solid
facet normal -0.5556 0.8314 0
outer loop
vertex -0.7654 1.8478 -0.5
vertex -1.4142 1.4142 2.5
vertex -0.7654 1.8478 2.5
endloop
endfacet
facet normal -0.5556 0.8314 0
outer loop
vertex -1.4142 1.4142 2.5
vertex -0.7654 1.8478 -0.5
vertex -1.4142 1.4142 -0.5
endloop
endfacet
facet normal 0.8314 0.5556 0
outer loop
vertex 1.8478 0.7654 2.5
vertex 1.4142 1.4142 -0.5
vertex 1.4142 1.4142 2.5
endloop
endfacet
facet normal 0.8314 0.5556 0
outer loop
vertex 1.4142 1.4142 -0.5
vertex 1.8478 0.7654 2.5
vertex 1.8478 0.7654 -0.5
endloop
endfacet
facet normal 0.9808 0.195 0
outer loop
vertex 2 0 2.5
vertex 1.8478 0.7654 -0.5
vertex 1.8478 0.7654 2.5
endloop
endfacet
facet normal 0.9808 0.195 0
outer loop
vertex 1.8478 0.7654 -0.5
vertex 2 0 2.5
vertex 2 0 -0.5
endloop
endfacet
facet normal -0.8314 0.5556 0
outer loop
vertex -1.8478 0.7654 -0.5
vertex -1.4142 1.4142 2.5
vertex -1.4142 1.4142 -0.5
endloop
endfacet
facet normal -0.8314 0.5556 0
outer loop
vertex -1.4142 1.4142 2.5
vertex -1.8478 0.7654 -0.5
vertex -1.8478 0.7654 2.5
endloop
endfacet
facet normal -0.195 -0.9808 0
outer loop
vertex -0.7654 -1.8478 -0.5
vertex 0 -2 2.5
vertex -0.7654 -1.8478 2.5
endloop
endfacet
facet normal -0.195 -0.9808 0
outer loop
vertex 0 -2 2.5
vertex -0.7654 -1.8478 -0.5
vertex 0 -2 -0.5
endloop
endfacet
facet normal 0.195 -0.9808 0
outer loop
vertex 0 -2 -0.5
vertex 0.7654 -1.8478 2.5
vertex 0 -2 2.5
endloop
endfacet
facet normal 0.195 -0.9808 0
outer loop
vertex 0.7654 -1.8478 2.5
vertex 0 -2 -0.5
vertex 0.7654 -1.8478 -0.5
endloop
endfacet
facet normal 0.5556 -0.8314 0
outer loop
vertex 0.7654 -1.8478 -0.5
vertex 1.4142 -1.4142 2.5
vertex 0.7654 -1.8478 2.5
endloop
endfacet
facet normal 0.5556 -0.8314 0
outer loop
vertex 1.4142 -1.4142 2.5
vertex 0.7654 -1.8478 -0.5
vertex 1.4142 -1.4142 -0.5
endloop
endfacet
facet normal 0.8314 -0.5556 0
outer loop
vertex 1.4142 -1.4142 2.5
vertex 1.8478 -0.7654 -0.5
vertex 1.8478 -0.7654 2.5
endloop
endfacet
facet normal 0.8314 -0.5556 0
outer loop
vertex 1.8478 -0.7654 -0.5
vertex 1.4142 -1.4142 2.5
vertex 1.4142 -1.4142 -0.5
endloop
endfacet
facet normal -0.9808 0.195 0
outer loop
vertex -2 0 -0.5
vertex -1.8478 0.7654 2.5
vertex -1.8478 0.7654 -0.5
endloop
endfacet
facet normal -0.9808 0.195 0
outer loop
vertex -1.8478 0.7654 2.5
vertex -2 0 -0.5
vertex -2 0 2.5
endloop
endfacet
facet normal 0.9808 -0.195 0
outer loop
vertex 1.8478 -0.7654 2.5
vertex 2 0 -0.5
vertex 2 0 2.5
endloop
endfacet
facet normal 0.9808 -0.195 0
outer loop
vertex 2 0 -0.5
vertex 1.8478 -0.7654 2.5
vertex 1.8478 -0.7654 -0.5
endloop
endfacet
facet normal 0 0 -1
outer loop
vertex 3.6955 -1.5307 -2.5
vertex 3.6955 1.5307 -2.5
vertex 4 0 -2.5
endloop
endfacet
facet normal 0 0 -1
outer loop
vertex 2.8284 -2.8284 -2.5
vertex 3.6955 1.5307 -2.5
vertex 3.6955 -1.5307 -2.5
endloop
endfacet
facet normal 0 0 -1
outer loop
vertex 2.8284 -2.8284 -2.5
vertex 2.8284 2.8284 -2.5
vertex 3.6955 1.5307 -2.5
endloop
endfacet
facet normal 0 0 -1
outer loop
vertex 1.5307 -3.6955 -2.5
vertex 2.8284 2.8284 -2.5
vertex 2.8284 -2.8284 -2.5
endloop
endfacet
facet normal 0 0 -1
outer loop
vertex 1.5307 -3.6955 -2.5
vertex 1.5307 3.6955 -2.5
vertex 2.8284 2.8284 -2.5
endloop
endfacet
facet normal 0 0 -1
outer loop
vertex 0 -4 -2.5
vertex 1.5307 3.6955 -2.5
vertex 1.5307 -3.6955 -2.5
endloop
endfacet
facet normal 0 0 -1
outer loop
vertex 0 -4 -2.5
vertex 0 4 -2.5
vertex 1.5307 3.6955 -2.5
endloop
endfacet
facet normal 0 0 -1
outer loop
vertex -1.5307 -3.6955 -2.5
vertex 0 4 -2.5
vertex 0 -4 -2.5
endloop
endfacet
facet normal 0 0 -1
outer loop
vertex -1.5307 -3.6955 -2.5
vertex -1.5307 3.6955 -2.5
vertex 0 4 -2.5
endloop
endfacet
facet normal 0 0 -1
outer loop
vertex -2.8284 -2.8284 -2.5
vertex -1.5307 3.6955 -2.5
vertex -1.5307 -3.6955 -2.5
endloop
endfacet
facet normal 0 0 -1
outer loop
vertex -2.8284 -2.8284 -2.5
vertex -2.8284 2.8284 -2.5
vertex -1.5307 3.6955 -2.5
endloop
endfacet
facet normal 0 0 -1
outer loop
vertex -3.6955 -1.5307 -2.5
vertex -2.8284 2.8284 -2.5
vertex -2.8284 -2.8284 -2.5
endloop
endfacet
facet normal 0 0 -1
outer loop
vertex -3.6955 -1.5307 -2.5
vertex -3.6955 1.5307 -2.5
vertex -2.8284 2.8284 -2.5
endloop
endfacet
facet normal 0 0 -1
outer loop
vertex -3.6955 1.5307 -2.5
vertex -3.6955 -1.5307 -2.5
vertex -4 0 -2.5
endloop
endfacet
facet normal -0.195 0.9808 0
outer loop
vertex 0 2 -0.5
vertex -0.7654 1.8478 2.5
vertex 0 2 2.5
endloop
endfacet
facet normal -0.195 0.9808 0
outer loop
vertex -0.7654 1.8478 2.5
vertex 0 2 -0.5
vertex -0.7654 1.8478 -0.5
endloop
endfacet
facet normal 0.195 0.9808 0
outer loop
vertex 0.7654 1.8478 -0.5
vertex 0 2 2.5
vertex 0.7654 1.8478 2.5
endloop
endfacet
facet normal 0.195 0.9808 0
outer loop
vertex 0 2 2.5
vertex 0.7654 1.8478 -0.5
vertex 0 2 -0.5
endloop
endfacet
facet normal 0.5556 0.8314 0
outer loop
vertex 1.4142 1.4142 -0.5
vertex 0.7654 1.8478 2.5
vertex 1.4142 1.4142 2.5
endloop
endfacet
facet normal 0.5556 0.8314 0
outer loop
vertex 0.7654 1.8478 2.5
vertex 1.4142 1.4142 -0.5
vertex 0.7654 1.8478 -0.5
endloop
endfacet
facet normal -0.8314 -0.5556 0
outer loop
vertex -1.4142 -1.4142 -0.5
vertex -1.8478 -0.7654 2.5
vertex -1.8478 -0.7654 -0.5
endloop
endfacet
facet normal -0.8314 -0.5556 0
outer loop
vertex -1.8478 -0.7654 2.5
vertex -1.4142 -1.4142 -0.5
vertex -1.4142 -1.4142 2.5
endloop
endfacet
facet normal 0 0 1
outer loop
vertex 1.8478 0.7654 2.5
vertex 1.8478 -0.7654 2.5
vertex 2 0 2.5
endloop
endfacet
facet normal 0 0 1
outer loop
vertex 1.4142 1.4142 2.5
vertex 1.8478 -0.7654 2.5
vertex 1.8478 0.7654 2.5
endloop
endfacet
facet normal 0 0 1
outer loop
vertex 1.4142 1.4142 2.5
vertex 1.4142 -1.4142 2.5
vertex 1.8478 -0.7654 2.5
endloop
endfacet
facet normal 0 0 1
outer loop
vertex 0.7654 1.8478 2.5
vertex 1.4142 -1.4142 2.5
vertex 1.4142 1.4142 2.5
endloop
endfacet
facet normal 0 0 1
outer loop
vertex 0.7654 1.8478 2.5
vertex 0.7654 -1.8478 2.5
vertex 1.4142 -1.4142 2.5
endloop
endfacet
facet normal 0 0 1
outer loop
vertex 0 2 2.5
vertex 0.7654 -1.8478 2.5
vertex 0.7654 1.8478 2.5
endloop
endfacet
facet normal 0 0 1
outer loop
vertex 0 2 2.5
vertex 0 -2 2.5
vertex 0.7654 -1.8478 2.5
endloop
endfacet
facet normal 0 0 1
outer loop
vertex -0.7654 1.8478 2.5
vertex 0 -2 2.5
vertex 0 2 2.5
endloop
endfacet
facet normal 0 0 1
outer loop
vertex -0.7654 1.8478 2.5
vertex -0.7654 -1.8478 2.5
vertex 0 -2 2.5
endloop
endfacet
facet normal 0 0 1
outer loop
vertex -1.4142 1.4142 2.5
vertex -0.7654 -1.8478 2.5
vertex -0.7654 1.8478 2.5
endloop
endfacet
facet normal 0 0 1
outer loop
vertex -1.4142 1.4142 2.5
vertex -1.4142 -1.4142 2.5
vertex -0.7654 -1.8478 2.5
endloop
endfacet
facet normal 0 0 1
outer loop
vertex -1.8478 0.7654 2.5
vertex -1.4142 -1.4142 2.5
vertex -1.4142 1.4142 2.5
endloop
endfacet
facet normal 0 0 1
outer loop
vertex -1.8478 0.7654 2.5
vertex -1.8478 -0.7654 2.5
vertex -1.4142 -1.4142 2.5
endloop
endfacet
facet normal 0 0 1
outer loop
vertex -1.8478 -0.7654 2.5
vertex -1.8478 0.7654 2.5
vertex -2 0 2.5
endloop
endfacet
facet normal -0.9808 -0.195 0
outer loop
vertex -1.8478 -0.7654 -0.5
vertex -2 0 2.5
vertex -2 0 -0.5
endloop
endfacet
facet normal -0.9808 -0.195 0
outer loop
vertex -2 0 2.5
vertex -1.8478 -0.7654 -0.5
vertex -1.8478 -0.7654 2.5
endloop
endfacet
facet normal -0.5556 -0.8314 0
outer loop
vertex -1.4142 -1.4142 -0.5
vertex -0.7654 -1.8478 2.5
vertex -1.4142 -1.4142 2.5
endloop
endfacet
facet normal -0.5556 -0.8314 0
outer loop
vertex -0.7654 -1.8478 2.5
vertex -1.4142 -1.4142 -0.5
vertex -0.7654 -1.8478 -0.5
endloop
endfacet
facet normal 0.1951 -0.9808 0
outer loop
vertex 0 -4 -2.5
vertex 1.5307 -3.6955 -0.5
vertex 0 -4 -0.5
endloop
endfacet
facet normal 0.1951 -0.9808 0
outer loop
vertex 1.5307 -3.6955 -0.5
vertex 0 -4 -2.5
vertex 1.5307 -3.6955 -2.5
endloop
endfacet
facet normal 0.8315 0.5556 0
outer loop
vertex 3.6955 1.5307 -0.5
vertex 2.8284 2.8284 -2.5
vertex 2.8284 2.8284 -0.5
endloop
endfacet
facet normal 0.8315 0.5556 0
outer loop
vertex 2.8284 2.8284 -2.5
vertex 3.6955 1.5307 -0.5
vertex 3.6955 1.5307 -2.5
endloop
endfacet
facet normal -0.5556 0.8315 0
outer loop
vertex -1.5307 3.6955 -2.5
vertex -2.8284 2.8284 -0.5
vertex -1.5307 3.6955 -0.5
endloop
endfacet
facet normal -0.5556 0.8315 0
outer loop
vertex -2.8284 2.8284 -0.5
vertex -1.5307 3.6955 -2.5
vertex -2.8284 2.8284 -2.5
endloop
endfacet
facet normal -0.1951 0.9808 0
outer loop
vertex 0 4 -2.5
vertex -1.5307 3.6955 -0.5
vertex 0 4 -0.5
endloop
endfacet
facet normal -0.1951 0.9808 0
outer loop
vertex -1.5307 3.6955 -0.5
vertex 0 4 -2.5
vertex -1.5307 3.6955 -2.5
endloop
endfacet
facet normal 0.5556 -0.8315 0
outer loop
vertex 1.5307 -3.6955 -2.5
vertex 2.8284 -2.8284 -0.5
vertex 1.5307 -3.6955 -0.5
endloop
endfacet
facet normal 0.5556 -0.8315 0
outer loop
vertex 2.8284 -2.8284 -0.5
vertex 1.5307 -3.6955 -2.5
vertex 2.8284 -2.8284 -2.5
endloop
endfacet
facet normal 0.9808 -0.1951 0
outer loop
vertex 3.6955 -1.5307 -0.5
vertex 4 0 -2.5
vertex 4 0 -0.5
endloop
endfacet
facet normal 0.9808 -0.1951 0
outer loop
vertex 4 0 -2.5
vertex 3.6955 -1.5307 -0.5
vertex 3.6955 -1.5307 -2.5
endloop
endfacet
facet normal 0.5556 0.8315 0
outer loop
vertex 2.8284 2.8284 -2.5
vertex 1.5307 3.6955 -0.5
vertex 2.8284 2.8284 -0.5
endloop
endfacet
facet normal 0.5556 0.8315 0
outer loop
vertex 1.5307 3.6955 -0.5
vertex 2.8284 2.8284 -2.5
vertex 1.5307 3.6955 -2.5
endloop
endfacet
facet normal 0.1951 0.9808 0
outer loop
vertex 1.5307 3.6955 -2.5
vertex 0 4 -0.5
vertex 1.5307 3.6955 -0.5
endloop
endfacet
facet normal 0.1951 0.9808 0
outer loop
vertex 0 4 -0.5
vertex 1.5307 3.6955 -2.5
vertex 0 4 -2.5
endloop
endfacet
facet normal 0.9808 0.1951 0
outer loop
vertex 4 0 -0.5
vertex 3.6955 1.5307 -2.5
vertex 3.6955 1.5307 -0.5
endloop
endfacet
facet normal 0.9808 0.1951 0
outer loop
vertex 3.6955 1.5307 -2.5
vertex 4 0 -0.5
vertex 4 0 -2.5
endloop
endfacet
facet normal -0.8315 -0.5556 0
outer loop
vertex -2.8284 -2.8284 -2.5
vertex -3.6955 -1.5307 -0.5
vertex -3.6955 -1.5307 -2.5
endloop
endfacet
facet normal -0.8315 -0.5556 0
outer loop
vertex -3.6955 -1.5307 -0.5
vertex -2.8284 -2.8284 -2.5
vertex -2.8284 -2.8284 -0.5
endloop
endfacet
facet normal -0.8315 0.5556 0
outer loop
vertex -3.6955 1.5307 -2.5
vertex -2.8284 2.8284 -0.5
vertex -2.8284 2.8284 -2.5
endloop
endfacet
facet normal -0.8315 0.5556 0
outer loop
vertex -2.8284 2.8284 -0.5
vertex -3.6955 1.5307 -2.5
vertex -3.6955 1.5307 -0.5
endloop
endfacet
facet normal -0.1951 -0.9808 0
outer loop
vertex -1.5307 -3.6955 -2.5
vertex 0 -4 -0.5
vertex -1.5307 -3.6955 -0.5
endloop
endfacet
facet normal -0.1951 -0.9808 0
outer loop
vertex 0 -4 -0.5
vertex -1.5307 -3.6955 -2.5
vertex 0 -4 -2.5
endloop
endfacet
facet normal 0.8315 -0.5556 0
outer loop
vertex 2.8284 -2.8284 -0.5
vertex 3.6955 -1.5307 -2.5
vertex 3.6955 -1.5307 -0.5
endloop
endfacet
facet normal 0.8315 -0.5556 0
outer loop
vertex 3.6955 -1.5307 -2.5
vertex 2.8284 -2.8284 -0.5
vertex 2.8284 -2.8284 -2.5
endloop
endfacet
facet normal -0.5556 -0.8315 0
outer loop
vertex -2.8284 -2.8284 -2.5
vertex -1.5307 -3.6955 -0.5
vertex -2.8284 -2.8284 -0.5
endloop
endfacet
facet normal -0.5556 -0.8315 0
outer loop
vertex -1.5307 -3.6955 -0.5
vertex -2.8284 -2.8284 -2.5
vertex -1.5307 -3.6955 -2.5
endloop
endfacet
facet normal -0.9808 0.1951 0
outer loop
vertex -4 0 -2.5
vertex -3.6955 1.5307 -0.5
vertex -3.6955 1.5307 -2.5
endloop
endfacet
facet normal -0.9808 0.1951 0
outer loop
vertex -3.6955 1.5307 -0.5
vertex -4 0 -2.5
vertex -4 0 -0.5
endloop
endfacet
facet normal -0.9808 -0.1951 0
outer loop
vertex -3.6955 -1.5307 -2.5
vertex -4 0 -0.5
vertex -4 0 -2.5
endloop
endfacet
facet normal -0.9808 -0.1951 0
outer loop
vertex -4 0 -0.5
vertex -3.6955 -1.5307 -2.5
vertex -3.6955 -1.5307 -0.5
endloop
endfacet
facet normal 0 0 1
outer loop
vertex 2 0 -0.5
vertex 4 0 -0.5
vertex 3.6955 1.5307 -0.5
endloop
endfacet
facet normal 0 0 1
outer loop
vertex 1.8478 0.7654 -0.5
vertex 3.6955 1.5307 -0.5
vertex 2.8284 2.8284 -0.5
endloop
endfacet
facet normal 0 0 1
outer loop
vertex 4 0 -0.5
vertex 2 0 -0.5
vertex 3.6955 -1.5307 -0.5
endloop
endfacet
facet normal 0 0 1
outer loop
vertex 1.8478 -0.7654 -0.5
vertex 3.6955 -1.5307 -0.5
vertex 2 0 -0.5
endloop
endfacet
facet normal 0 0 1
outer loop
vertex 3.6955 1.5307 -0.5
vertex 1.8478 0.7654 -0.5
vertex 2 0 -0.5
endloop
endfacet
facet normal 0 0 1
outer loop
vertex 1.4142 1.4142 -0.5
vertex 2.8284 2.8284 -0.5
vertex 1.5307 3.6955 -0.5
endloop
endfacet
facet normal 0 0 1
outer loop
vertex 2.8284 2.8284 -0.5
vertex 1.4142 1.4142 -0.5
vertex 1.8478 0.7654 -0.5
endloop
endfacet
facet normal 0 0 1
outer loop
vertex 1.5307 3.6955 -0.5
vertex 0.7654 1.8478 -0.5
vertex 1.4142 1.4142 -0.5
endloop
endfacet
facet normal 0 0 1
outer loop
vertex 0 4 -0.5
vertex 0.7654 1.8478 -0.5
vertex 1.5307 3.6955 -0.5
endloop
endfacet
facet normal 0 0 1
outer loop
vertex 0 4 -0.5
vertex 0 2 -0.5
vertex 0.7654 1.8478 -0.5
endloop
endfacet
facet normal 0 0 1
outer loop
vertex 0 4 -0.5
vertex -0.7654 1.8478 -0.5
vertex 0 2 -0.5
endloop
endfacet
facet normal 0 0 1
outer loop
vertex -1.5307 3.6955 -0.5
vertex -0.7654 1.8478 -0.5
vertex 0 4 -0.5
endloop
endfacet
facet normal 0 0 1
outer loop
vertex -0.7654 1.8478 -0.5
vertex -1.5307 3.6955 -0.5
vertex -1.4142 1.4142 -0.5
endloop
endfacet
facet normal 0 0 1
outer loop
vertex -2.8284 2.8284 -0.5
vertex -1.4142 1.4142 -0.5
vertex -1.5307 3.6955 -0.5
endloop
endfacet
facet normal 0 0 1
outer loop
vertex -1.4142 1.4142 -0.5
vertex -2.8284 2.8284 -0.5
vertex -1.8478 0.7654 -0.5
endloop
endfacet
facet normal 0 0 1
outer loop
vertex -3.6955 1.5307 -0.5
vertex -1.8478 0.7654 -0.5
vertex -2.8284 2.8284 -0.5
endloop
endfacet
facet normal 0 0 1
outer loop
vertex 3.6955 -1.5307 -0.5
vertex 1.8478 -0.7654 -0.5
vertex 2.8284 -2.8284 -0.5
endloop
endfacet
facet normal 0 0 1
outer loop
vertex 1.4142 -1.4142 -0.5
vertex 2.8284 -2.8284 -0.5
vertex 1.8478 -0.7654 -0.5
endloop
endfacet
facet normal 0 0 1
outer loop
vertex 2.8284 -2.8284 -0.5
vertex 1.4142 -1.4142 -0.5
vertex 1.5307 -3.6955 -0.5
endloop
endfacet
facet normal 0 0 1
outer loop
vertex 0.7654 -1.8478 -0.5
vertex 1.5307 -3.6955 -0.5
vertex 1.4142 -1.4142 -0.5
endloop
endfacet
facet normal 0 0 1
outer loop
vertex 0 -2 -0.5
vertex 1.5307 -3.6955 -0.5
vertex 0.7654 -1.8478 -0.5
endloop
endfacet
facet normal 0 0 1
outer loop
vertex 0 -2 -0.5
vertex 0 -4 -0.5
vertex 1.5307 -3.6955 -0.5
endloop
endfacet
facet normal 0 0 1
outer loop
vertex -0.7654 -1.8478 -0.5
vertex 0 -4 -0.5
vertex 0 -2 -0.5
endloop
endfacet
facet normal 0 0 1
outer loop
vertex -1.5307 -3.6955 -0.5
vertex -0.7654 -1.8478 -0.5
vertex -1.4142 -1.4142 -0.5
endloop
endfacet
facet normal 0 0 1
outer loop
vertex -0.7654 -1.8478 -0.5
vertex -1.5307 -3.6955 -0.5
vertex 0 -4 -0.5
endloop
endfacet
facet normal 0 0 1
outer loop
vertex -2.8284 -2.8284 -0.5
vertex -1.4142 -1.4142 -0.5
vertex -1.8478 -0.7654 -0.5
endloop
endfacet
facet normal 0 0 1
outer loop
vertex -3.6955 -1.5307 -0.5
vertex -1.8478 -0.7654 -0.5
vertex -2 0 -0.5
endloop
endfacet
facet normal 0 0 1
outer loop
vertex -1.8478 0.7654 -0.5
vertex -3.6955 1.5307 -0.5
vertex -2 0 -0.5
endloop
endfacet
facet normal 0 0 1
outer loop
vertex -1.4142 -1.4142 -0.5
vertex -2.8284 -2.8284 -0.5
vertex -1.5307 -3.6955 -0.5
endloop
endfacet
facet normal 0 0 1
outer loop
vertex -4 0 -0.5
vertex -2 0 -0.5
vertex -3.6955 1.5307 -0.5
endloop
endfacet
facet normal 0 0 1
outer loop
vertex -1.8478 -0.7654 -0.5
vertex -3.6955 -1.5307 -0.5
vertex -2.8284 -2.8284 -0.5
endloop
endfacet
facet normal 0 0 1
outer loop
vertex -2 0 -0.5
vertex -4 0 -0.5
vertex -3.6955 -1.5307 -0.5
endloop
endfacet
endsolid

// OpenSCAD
// file: cutter_helpers.scad
module 2d_to_wall(thickness=2,height=10){
    difference(){
        minkowski(){
            linear_extrude(height=height/2,center=true)children();
            cylinder(r=thickness,height/2,center=true);
        }
        linear_extrude(height=height*2,center=true)children();
    }
}
module add_bottom_lip(thickness=2,lip=2){
    union(){
        children();
        difference(){
            minkowski(){
                cylinder(r=lip,thickness);
                children();
            }
            translate([0,0,thickness])minkowski(){
                cylinder(r=lip*2,thickness);
                children();
            }
        }
    }
}
// main file
use <cutter_helpers.scad>;

scale = 1;
file = "default.dxf";
lip=2;
height=10;
thickness=2;
$fn=16;

add_bottom_lip(thickness,lip)2d_to_wall(thickness,height)scale([scale,scale,1])import(file=file);
